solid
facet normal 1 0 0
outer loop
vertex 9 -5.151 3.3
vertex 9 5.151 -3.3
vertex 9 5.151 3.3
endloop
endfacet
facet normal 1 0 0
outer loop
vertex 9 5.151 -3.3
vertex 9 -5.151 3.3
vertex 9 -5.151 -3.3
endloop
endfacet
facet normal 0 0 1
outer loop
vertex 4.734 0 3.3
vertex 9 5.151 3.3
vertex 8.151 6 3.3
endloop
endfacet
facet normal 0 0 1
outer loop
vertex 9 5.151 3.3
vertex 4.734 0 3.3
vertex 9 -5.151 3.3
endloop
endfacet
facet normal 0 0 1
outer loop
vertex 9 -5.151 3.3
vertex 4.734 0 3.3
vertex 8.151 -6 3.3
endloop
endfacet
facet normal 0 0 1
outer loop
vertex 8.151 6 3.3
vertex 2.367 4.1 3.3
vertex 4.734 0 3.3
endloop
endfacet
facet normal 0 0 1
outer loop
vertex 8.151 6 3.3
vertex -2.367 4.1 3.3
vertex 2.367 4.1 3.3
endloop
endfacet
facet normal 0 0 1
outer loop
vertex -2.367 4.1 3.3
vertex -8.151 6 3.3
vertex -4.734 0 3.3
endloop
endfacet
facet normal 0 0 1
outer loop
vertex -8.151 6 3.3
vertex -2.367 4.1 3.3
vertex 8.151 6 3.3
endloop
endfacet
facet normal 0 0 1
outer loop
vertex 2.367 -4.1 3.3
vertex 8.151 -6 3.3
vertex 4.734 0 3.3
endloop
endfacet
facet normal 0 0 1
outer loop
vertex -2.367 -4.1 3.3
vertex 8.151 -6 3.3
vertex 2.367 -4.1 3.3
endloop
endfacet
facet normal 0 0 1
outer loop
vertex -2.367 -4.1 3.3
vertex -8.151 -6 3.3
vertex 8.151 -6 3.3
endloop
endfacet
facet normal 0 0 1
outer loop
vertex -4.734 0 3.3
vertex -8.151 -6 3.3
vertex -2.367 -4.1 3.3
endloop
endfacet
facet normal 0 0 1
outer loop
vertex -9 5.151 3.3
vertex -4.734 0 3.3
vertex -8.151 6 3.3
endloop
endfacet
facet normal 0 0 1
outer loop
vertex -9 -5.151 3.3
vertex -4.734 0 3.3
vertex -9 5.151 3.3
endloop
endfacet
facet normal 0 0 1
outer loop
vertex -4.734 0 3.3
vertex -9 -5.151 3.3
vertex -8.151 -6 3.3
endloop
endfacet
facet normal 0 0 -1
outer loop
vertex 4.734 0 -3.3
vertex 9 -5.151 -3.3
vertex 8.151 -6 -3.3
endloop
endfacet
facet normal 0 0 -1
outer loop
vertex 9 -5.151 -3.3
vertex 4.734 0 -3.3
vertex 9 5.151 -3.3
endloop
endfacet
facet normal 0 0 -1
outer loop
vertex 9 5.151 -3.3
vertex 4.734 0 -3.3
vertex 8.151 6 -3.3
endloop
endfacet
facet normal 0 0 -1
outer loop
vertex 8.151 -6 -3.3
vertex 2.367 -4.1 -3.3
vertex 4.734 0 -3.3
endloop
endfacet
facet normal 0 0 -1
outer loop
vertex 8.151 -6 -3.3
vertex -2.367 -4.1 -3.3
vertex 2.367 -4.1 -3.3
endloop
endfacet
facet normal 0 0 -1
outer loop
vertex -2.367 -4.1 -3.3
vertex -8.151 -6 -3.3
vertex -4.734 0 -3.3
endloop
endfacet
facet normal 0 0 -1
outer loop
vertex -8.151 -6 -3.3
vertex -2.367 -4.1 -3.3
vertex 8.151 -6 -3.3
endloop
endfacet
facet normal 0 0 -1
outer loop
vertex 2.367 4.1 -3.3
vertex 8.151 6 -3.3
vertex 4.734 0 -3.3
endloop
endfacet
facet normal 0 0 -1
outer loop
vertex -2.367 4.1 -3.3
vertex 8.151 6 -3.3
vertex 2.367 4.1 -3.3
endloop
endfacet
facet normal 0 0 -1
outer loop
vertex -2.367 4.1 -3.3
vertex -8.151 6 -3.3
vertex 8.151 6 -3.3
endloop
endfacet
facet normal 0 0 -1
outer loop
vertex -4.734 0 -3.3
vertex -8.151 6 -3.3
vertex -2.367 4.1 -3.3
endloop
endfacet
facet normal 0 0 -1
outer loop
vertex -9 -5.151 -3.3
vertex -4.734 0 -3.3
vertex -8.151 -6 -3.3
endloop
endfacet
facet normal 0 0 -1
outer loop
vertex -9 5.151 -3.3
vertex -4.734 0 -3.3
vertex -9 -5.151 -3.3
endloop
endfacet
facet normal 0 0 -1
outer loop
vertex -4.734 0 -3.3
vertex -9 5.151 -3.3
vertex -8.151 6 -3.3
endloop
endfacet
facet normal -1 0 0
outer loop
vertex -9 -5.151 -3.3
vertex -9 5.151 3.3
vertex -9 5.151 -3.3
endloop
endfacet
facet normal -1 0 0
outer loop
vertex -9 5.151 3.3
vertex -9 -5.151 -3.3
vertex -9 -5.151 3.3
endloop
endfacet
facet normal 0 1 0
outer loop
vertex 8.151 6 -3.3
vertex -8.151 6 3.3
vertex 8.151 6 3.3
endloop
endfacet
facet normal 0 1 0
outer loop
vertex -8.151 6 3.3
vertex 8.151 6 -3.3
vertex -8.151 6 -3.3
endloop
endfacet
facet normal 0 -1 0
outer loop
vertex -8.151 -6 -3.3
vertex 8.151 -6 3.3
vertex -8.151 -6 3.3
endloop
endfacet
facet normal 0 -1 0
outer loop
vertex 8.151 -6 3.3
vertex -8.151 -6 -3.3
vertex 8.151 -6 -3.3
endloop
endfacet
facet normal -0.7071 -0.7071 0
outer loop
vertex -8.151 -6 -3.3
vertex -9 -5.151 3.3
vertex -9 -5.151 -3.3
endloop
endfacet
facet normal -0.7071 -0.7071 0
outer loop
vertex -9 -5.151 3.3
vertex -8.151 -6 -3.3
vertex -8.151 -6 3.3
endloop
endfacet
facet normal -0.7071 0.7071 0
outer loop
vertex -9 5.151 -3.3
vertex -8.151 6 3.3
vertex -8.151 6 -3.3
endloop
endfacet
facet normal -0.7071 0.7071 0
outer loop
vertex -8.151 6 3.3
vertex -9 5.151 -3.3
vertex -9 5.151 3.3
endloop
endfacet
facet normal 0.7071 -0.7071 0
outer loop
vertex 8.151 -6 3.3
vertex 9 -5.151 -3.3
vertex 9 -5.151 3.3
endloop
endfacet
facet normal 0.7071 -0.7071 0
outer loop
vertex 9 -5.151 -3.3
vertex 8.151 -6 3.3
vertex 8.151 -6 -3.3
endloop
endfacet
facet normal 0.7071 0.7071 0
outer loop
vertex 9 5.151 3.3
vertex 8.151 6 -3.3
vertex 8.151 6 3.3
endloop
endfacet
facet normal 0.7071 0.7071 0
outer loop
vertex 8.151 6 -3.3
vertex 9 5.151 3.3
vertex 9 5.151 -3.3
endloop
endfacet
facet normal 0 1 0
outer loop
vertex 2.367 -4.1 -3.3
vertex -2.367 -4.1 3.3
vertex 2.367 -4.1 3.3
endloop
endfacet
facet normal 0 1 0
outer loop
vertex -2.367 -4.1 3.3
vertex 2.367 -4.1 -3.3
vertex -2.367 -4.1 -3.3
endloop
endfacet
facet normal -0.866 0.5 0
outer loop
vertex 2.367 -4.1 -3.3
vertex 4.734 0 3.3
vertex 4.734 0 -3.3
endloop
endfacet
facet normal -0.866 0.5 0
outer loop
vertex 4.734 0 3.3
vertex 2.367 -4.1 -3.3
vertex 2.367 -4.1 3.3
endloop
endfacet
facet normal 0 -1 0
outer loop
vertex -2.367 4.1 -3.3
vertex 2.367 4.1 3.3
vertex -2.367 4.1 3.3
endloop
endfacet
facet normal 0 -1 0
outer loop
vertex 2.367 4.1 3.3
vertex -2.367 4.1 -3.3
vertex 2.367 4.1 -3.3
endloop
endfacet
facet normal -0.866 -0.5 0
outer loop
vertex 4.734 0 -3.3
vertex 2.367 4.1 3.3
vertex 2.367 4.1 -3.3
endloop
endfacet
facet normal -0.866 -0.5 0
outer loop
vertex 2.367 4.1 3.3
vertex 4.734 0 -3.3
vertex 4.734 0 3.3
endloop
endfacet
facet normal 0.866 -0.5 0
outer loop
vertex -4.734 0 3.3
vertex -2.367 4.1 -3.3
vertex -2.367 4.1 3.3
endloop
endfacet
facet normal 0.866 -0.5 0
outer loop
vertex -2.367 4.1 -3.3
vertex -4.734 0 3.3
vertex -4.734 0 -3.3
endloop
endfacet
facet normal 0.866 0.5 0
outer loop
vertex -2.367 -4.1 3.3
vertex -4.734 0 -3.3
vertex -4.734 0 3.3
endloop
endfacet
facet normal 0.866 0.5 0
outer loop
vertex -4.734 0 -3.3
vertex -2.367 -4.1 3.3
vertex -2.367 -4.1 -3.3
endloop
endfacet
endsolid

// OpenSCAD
$fn=64;

screw_d = 6.0;
across_flats = 8.0;
thickness = 6.6;

t_head_w = 12.0;
t_head_l = 18.0;
t_neck_w = 8.0;
t_neck_l = 10.0;

chamfer = 0.6;

module hex_prism(af, h){
    r = af / sqrt(3);
    cylinder(h=h, r=r, center=true, $fn=6);
}

module tslot_nut_body(){
    union(){
        cube([t_head_l, t_head_w, thickness], center=true);
        cube([t_neck_l, t_neck_w, thickness], center=true);
    }
}

module chamfered_body(){
    difference(){
        tslot_nut_body();
        for (sx=[-1,1], sy=[-1,1]){
            translate([sx*(t_head_l/2), sy*(t_head_w/2), 0])
                rotate([0,0,45])
                    cube([chamfer*2, chamfer*2, thickness+0.2], center=true);
        }
    }
}

module tslot_nut(){
    difference(){
        chamfered_body();
        translate([0,0,0])
            cylinder(h=thickness+0.4, d=screw_d+0.4, center=true, $fn=64);
        translate([0,0,0])
            hex_prism(across_flats+0.2, thickness+0.4);
    }
}

tslot_nut();
